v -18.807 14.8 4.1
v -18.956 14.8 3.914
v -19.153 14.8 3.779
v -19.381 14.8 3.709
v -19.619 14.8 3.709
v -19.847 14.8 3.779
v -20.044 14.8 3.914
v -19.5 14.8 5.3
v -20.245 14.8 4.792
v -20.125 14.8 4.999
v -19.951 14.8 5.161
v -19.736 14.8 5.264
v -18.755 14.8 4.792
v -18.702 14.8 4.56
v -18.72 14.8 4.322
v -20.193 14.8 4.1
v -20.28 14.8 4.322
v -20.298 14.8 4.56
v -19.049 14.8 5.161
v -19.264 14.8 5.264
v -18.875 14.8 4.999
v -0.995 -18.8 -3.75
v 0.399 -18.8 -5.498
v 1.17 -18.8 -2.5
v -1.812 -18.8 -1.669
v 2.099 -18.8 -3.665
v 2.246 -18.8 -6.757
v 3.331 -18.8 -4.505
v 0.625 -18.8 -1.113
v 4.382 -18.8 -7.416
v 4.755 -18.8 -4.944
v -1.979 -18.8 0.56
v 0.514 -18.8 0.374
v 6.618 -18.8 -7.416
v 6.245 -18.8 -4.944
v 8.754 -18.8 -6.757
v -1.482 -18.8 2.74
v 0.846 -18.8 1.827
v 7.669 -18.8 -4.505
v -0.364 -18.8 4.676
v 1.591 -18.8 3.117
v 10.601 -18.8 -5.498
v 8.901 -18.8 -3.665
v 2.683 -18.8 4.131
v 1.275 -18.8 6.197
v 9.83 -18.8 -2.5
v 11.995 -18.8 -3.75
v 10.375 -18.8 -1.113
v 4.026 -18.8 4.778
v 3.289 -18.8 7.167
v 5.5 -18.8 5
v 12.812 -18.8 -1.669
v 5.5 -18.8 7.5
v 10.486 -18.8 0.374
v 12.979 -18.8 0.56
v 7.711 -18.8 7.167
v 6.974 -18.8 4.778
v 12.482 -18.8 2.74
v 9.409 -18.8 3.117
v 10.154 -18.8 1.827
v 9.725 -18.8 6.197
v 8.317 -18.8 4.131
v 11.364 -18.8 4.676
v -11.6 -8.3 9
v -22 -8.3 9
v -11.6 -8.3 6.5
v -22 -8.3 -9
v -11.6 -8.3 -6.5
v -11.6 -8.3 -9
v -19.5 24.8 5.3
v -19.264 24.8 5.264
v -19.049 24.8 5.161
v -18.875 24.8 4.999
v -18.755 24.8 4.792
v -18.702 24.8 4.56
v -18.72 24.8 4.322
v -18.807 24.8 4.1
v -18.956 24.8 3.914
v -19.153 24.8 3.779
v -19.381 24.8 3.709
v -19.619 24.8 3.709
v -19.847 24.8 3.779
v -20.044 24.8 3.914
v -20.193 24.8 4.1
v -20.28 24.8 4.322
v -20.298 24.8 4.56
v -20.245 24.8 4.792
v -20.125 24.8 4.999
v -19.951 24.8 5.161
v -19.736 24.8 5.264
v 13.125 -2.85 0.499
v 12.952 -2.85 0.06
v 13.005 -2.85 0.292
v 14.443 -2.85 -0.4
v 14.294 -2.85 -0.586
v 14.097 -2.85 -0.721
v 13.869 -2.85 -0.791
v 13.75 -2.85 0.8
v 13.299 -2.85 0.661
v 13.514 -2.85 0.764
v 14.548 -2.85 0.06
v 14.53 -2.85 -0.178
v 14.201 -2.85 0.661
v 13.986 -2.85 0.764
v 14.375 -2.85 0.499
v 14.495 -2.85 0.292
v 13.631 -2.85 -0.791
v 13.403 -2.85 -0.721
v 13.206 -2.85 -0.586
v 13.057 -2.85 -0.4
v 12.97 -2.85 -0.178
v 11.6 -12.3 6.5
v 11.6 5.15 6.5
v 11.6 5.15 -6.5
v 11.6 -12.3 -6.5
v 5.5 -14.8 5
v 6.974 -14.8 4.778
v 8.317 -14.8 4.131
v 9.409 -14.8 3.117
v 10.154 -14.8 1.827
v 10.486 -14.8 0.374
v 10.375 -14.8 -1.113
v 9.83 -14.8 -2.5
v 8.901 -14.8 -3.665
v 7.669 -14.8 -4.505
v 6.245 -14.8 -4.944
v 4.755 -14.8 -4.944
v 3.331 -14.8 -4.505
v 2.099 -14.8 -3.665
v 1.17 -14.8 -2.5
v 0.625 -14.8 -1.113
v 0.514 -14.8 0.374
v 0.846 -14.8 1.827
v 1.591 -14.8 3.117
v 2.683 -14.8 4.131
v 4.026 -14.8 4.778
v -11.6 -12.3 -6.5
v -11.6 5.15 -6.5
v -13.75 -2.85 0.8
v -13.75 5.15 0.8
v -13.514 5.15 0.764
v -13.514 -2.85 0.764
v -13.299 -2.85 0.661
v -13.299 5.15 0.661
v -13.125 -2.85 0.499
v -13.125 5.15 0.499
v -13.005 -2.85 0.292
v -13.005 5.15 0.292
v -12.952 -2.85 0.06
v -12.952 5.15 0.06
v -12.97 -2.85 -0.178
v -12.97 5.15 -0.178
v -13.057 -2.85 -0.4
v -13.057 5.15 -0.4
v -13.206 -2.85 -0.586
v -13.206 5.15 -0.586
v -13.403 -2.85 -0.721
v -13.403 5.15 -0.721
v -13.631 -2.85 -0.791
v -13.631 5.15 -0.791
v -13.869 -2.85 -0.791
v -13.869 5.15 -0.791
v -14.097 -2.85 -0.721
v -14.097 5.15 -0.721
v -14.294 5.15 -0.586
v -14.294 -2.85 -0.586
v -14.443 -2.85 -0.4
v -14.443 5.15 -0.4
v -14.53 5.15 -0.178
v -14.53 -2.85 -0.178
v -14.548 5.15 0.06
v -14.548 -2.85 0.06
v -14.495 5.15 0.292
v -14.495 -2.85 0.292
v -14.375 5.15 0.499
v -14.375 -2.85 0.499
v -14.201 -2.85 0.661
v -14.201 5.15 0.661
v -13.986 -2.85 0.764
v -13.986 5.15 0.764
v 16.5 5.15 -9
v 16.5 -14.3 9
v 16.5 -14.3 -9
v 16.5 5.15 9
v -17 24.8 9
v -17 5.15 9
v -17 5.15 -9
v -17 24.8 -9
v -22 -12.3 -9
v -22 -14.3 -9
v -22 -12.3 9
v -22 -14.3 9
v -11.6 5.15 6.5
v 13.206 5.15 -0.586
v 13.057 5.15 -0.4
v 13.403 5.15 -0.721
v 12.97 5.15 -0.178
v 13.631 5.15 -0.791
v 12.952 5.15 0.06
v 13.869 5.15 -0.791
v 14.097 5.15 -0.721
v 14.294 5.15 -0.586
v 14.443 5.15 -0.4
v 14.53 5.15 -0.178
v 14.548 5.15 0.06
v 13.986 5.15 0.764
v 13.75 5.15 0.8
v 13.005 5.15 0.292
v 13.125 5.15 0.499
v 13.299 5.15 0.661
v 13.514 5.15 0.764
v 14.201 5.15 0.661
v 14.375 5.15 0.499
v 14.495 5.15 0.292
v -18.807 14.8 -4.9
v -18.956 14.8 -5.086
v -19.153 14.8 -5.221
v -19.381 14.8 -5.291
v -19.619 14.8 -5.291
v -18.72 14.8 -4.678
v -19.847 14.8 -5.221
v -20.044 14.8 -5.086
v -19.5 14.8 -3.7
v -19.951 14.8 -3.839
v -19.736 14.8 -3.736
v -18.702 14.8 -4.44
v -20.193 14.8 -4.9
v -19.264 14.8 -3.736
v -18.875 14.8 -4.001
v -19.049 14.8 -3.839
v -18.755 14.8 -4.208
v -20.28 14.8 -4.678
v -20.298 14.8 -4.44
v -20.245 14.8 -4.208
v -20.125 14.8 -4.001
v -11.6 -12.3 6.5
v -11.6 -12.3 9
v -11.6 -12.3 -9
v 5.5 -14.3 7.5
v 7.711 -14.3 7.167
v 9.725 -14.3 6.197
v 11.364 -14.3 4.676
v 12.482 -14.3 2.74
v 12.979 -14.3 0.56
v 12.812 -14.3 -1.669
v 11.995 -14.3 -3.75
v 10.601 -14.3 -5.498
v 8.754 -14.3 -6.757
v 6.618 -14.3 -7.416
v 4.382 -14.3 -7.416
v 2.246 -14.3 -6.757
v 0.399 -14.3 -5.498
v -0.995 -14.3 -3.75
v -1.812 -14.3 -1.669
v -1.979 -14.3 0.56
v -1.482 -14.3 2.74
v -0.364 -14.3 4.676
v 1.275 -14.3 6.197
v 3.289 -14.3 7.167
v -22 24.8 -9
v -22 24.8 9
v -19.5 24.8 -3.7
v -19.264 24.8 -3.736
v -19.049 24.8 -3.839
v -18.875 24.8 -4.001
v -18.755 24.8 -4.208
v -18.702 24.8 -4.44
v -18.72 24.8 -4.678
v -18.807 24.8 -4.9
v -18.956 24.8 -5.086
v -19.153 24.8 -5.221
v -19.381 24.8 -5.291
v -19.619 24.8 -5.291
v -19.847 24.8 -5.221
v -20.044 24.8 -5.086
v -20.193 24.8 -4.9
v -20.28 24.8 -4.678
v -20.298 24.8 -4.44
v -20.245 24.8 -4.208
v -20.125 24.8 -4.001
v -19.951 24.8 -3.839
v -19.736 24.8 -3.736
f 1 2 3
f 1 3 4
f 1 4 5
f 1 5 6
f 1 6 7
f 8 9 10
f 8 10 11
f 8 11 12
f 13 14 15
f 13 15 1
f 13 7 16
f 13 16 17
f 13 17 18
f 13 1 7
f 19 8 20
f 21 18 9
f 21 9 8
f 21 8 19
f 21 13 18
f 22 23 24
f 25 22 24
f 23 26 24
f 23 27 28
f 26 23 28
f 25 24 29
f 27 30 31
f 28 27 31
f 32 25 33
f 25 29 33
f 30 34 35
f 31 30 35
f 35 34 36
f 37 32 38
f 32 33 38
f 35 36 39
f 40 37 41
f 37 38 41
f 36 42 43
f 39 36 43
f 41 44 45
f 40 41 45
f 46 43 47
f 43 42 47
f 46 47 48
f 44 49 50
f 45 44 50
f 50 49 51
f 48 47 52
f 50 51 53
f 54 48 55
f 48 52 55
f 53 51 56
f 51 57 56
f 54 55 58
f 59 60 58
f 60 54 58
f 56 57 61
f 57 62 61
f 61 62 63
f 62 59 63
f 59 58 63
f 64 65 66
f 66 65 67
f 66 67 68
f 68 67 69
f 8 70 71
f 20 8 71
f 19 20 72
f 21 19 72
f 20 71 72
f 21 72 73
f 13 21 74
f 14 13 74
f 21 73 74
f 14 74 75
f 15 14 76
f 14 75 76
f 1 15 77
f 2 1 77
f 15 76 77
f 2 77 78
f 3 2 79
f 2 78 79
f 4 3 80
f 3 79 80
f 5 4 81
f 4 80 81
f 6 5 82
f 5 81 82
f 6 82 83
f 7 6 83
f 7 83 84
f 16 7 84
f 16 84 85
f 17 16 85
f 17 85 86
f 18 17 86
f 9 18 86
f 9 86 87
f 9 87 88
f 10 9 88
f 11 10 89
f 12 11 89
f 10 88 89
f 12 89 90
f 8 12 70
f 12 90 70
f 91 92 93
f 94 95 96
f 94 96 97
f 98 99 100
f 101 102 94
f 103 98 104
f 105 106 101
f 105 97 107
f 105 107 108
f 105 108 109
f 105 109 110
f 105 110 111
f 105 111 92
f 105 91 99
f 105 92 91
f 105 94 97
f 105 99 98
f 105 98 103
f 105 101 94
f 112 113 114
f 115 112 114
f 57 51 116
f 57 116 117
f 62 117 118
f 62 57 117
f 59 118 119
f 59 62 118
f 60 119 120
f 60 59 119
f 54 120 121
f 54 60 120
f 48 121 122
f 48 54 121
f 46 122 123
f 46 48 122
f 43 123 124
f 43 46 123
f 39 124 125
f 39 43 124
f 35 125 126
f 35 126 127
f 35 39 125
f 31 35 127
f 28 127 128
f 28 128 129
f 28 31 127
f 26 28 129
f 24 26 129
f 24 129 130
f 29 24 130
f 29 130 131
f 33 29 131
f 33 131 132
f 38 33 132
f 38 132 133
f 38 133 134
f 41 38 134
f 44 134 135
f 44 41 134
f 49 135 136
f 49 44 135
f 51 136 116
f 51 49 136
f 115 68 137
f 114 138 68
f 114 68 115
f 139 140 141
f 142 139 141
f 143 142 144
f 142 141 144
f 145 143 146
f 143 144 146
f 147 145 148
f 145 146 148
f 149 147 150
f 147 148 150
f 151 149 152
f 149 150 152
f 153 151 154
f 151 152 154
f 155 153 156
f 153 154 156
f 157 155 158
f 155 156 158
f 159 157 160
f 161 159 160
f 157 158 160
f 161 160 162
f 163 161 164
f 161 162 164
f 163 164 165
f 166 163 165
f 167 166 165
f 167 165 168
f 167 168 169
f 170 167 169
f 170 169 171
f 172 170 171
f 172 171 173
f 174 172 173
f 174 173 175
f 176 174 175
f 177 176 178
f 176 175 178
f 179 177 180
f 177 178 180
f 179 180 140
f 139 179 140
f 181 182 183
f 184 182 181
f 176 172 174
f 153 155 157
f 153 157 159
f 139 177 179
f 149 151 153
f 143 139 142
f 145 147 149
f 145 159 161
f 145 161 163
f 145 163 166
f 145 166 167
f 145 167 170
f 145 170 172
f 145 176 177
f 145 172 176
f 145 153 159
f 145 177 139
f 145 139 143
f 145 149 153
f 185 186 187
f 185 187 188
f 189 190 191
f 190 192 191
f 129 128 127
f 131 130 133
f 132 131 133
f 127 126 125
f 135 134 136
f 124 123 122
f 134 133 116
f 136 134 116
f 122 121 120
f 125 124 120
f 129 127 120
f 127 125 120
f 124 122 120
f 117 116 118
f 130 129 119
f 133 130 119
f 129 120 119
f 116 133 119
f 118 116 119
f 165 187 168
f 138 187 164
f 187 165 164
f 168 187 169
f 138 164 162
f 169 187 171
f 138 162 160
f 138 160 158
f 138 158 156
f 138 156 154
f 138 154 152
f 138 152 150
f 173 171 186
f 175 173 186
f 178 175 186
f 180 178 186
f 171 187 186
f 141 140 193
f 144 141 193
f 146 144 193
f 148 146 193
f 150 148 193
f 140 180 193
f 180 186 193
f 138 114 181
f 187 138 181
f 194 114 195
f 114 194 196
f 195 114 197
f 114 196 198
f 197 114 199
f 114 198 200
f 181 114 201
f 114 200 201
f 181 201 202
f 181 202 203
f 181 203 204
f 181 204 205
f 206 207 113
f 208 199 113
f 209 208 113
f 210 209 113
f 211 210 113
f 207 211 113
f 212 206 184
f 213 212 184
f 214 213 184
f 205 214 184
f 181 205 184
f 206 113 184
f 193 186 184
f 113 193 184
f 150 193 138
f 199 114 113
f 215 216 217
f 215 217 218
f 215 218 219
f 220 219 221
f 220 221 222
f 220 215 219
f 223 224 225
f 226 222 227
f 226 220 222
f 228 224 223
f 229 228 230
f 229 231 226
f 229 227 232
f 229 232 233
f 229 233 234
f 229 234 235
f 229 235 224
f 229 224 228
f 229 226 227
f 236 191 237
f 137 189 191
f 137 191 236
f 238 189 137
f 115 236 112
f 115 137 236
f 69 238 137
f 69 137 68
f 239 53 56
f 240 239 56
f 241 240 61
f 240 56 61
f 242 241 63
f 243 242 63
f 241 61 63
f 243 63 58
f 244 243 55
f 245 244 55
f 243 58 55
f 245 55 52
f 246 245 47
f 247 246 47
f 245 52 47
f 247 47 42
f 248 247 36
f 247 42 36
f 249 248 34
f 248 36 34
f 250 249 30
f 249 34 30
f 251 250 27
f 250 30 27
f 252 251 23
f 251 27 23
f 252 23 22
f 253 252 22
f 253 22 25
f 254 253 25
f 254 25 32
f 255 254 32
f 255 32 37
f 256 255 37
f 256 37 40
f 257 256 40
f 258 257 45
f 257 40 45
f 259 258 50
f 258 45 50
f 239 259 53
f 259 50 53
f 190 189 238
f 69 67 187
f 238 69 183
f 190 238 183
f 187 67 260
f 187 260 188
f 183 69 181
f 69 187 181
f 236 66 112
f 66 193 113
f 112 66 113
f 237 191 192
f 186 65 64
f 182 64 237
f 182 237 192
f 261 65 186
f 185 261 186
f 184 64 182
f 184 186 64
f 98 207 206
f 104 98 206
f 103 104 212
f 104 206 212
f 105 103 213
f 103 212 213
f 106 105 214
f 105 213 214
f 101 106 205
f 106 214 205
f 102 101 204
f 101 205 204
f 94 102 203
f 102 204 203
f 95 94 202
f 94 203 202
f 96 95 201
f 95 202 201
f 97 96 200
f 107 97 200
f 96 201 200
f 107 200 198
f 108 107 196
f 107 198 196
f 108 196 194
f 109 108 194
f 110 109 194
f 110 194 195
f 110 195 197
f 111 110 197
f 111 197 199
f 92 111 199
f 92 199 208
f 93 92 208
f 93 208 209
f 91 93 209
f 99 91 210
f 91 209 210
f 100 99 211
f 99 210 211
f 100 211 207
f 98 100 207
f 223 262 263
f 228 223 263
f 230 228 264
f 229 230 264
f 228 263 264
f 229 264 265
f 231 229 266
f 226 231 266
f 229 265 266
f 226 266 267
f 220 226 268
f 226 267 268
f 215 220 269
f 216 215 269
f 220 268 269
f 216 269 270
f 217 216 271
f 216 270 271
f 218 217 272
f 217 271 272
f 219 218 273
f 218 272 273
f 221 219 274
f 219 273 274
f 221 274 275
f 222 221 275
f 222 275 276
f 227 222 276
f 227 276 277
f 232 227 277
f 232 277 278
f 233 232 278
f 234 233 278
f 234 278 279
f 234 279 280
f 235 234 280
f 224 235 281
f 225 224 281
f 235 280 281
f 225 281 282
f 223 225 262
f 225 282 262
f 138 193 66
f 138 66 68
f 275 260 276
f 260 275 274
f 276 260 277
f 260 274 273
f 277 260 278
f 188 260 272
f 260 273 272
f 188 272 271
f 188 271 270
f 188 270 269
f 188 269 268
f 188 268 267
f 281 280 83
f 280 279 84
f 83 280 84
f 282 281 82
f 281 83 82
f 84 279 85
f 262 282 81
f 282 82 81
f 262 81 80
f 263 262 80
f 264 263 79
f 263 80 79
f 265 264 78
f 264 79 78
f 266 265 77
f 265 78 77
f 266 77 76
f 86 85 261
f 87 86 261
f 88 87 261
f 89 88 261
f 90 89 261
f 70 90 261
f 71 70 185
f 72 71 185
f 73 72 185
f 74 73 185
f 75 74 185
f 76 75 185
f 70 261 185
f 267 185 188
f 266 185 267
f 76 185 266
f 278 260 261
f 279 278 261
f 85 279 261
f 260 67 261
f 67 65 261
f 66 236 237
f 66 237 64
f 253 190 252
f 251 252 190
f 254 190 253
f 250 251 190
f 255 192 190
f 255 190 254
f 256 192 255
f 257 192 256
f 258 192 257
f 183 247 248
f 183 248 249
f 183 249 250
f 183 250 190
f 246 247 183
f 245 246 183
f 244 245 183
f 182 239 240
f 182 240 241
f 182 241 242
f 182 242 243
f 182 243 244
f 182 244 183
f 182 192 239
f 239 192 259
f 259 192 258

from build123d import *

# Parameters (mm, degrees)
SKETCH1_W               = 38.5
SKETCH1_H               = 19.45
BOSS_EXTRUDE1_DEPTH     = 9
SKETCH2_W               = 5
SKETCH2_H               = 19.65
BOSS_EXTRUDE2_DEPTH     = 9
SKETCH3_R               = 7.5
BOSS_EXTRUDE3_DEPTH     = 4.5
SKETCH4_W               = 23.2
SKETCH4_H               = 13
CUT_EXTRUDE1_DEPTH      = 17.45
SKETCH5_R               = 5
CUT_EXTRUDE3_DEPTH      = 4
CUT_EXTRUDE4_DEPTH      = 35.351710292
CUT_EXTRUDE4_DEPTH_BACK = 35.351710292
SKETCH6_W               = 10.4
SKETCH6_H               = 4
SKETCH7_R               = 0.8
CUT_EXTRUDE5_DEPTH      = 8
SKETCH8_R               = 0.8
CUT_EXTRUDE6_DEPTH      = 8
SKETCH9_R               = 0.8
CUT_EXTRUDE7_DEPTH      = 10
SKETCH10_R              = 0.8
CUT_EXTRUDE8_DEPTH      = 10


with BuildPart() as part:
    # Sketch1 → Boss-Extrude1 (new, symmetric)
    with BuildSketch(Plane.XY):
        with Locations((-2.75, -4.575)):
            Rectangle(SKETCH1_W, SKETCH1_H)
    extrude(amount=BOSS_EXTRUDE1_DEPTH, both=True)

    # Sketch2 → Boss-Extrude2 (add, symmetric)
    with BuildSketch(Plane.XY):
        with Locations((-19.5, 14.975)):
            Rectangle(SKETCH2_W, SKETCH2_H)
    extrude(amount=BOSS_EXTRUDE2_DEPTH, both=True)

    # Sketch3 → Boss-Extrude3 (add)
    with BuildSketch(Plane(origin=(0, -18.8, 0), x_dir=(1, 0, 0), z_dir=(0, 1, 0))):
        with Locations(Location((5.5, 0, 0), (0, 0, 270))):
            Circle(SKETCH3_R)
    extrude(amount=BOSS_EXTRUDE3_DEPTH)

    # Sketch4 → Cut-Extrude1 (cut)
    with BuildSketch(Plane(origin=(0, 5.15, 0), x_dir=(1, 0, 0), z_dir=(0, 1, 0))):
        Rectangle(SKETCH4_W, SKETCH4_H)
    extrude(amount=-CUT_EXTRUDE1_DEPTH, mode=Mode.SUBTRACT)

    # Sketch5 → Cut-Extrude3 (cut)
    with BuildSketch(Plane(origin=(0, -18.8, 0), x_dir=(1, 0, 0), z_dir=(0, 1, 0))):
        with Locations(Location((5.5, 0, 0), (0, 0, 270))):
            Circle(SKETCH5_R)
    extrude(amount=CUT_EXTRUDE3_DEPTH, mode=Mode.SUBTRACT)

    # Sketch6 → Cut-Extrude4 (cut, two sides: drawn at the far end of the back side and taken through both)
    with BuildSketch(Plane.XY.offset(-CUT_EXTRUDE4_DEPTH_BACK)):
        with Locations((-16.8, -10.3)):
            Rectangle(SKETCH6_W, SKETCH6_H)
    extrude(amount=CUT_EXTRUDE4_DEPTH + CUT_EXTRUDE4_DEPTH_BACK, mode=Mode.SUBTRACT)

    # Sketch7 → Cut-Extrude5 (cut)
    with BuildSketch(Plane(origin=(0, 5.15, 0), x_dir=(1, 0, 0), z_dir=(0, 1, 0))):
        with Locations(Location((-13.75, 0, 0), (0, 0, 270))):
            Circle(SKETCH7_R)
    extrude(amount=-CUT_EXTRUDE5_DEPTH, mode=Mode.SUBTRACT)

    # Sketch8 → Cut-Extrude6 (cut)
    with BuildSketch(Plane(origin=(0, 5.15, 0), x_dir=(1, 0, 0), z_dir=(0, 1, 0))):
        with Locations(Location((13.75, 0, 0), (0, 0, 270))):
            Circle(SKETCH8_R)
    extrude(amount=-CUT_EXTRUDE6_DEPTH, mode=Mode.SUBTRACT)

    # Sketch9 → Cut-Extrude7 (cut)
    with BuildSketch(Plane(origin=(0, 24.8, 0), x_dir=(1, 0, 0), z_dir=(0, 1, 0))):
        with Locations(Location((-19.5, -4.5, 0), (0, 0, 270))):
            Circle(SKETCH9_R)
    extrude(amount=-CUT_EXTRUDE7_DEPTH, mode=Mode.SUBTRACT)

    # Sketch10 → Cut-Extrude8 (cut)
    with BuildSketch(Plane(origin=(0, 24.8, 0), x_dir=(1, 0, 0), z_dir=(0, 1, 0))):
        with Locations(Location((-19.5, 4.5, 0), (0, 0, 270))):
            Circle(SKETCH10_R)
    extrude(amount=-CUT_EXTRUDE8_DEPTH, mode=Mode.SUBTRACT)


solid = part.part
